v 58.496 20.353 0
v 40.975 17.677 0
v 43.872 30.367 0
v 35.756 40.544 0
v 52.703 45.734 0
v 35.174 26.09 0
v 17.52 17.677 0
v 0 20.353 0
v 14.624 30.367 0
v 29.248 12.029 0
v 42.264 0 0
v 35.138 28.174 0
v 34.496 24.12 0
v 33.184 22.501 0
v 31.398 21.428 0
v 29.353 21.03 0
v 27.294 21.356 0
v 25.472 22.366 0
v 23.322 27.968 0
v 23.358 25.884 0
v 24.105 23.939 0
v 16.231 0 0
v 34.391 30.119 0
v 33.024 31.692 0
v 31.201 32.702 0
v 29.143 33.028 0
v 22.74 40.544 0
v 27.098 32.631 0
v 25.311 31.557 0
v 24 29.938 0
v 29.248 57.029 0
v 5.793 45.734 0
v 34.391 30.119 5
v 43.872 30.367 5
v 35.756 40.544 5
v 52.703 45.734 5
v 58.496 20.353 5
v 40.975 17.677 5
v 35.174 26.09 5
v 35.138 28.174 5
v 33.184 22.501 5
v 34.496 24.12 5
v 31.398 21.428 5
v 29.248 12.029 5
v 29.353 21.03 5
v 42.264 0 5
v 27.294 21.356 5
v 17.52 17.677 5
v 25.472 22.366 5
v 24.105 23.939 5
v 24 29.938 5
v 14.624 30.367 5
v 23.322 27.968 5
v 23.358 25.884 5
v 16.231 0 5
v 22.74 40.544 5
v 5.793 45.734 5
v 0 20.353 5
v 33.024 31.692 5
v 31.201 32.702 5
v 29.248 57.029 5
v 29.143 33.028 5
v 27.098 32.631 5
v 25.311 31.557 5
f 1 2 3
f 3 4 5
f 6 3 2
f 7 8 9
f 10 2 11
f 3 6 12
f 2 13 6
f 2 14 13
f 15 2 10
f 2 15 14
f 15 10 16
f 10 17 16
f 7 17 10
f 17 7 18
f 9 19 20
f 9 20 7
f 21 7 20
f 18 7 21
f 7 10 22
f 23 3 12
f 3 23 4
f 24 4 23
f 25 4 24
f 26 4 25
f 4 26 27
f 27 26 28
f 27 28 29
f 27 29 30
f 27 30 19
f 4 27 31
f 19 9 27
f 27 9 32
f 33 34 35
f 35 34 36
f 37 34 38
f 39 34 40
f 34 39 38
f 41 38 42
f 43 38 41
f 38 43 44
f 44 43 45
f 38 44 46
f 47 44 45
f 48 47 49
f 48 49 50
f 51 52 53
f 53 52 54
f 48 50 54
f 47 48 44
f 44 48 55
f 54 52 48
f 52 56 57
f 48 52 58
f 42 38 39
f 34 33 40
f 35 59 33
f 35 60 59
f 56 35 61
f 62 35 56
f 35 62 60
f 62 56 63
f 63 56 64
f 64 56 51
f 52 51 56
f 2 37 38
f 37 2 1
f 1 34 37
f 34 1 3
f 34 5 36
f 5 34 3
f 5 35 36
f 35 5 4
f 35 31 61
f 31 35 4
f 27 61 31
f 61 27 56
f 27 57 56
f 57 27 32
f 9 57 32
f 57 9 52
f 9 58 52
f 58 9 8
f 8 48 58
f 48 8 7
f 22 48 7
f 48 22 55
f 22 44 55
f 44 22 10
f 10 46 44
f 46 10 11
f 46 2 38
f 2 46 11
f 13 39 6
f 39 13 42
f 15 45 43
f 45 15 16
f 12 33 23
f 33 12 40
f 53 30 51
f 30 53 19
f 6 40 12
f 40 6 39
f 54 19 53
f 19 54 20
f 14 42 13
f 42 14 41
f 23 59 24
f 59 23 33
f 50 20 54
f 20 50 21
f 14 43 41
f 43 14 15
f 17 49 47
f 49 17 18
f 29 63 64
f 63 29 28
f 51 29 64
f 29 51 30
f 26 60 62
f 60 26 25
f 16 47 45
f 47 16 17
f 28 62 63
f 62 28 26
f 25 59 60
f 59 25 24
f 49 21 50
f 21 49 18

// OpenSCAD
$fn = 32;

// ----------------------------------------------------------------------
// Star wheel: 7-point star, R30
// ----------------------------------------------------------------------

// --- parameters (mm) ---
n_points = 7;             // number of points / teeth
r_out = 30;               // tip radius
r_in = 15;                // root radius
bore_r = 6;               // centre bore radius
plate_t = 5;              // plate thickness, Z (extrusion height)
bore_d = 12;              // centre bore diameter

profile = [[29.248, 57.029], [22.74, 40.544], [5.793, 45.734], [14.624, 30.367], [0, 20.353], [17.52, 17.677], [16.231, 0], [29.248, 12.029], [42.264, 0], [40.975, 17.677], [58.496, 20.353], [43.872, 30.367], [52.703, 45.734], [35.756, 40.544]];  // primary outline, 14 points, counter clockwise
void_1 = [[35.138, 28.174], [34.391, 30.119], [33.024, 31.692], [31.201, 32.702], [29.143, 33.028], [27.098, 32.631], [25.311, 31.557], [24, 29.938], [23.322, 27.968], [23.358, 25.884], [24.105, 23.939], [25.472, 22.366], [27.294, 21.356], [29.353, 21.03], [31.398, 21.428], [33.184, 22.501], [34.496, 24.12], [35.174, 26.09]];  // centre bore, 18 points

// --- the one profile operation ---
difference() {
  linear_extrude(height = plate_t) polygon(points = profile);
  translate([0, 0, -1])
    linear_extrude(height = plate_t + 2) polygon(points = void_1);
}
